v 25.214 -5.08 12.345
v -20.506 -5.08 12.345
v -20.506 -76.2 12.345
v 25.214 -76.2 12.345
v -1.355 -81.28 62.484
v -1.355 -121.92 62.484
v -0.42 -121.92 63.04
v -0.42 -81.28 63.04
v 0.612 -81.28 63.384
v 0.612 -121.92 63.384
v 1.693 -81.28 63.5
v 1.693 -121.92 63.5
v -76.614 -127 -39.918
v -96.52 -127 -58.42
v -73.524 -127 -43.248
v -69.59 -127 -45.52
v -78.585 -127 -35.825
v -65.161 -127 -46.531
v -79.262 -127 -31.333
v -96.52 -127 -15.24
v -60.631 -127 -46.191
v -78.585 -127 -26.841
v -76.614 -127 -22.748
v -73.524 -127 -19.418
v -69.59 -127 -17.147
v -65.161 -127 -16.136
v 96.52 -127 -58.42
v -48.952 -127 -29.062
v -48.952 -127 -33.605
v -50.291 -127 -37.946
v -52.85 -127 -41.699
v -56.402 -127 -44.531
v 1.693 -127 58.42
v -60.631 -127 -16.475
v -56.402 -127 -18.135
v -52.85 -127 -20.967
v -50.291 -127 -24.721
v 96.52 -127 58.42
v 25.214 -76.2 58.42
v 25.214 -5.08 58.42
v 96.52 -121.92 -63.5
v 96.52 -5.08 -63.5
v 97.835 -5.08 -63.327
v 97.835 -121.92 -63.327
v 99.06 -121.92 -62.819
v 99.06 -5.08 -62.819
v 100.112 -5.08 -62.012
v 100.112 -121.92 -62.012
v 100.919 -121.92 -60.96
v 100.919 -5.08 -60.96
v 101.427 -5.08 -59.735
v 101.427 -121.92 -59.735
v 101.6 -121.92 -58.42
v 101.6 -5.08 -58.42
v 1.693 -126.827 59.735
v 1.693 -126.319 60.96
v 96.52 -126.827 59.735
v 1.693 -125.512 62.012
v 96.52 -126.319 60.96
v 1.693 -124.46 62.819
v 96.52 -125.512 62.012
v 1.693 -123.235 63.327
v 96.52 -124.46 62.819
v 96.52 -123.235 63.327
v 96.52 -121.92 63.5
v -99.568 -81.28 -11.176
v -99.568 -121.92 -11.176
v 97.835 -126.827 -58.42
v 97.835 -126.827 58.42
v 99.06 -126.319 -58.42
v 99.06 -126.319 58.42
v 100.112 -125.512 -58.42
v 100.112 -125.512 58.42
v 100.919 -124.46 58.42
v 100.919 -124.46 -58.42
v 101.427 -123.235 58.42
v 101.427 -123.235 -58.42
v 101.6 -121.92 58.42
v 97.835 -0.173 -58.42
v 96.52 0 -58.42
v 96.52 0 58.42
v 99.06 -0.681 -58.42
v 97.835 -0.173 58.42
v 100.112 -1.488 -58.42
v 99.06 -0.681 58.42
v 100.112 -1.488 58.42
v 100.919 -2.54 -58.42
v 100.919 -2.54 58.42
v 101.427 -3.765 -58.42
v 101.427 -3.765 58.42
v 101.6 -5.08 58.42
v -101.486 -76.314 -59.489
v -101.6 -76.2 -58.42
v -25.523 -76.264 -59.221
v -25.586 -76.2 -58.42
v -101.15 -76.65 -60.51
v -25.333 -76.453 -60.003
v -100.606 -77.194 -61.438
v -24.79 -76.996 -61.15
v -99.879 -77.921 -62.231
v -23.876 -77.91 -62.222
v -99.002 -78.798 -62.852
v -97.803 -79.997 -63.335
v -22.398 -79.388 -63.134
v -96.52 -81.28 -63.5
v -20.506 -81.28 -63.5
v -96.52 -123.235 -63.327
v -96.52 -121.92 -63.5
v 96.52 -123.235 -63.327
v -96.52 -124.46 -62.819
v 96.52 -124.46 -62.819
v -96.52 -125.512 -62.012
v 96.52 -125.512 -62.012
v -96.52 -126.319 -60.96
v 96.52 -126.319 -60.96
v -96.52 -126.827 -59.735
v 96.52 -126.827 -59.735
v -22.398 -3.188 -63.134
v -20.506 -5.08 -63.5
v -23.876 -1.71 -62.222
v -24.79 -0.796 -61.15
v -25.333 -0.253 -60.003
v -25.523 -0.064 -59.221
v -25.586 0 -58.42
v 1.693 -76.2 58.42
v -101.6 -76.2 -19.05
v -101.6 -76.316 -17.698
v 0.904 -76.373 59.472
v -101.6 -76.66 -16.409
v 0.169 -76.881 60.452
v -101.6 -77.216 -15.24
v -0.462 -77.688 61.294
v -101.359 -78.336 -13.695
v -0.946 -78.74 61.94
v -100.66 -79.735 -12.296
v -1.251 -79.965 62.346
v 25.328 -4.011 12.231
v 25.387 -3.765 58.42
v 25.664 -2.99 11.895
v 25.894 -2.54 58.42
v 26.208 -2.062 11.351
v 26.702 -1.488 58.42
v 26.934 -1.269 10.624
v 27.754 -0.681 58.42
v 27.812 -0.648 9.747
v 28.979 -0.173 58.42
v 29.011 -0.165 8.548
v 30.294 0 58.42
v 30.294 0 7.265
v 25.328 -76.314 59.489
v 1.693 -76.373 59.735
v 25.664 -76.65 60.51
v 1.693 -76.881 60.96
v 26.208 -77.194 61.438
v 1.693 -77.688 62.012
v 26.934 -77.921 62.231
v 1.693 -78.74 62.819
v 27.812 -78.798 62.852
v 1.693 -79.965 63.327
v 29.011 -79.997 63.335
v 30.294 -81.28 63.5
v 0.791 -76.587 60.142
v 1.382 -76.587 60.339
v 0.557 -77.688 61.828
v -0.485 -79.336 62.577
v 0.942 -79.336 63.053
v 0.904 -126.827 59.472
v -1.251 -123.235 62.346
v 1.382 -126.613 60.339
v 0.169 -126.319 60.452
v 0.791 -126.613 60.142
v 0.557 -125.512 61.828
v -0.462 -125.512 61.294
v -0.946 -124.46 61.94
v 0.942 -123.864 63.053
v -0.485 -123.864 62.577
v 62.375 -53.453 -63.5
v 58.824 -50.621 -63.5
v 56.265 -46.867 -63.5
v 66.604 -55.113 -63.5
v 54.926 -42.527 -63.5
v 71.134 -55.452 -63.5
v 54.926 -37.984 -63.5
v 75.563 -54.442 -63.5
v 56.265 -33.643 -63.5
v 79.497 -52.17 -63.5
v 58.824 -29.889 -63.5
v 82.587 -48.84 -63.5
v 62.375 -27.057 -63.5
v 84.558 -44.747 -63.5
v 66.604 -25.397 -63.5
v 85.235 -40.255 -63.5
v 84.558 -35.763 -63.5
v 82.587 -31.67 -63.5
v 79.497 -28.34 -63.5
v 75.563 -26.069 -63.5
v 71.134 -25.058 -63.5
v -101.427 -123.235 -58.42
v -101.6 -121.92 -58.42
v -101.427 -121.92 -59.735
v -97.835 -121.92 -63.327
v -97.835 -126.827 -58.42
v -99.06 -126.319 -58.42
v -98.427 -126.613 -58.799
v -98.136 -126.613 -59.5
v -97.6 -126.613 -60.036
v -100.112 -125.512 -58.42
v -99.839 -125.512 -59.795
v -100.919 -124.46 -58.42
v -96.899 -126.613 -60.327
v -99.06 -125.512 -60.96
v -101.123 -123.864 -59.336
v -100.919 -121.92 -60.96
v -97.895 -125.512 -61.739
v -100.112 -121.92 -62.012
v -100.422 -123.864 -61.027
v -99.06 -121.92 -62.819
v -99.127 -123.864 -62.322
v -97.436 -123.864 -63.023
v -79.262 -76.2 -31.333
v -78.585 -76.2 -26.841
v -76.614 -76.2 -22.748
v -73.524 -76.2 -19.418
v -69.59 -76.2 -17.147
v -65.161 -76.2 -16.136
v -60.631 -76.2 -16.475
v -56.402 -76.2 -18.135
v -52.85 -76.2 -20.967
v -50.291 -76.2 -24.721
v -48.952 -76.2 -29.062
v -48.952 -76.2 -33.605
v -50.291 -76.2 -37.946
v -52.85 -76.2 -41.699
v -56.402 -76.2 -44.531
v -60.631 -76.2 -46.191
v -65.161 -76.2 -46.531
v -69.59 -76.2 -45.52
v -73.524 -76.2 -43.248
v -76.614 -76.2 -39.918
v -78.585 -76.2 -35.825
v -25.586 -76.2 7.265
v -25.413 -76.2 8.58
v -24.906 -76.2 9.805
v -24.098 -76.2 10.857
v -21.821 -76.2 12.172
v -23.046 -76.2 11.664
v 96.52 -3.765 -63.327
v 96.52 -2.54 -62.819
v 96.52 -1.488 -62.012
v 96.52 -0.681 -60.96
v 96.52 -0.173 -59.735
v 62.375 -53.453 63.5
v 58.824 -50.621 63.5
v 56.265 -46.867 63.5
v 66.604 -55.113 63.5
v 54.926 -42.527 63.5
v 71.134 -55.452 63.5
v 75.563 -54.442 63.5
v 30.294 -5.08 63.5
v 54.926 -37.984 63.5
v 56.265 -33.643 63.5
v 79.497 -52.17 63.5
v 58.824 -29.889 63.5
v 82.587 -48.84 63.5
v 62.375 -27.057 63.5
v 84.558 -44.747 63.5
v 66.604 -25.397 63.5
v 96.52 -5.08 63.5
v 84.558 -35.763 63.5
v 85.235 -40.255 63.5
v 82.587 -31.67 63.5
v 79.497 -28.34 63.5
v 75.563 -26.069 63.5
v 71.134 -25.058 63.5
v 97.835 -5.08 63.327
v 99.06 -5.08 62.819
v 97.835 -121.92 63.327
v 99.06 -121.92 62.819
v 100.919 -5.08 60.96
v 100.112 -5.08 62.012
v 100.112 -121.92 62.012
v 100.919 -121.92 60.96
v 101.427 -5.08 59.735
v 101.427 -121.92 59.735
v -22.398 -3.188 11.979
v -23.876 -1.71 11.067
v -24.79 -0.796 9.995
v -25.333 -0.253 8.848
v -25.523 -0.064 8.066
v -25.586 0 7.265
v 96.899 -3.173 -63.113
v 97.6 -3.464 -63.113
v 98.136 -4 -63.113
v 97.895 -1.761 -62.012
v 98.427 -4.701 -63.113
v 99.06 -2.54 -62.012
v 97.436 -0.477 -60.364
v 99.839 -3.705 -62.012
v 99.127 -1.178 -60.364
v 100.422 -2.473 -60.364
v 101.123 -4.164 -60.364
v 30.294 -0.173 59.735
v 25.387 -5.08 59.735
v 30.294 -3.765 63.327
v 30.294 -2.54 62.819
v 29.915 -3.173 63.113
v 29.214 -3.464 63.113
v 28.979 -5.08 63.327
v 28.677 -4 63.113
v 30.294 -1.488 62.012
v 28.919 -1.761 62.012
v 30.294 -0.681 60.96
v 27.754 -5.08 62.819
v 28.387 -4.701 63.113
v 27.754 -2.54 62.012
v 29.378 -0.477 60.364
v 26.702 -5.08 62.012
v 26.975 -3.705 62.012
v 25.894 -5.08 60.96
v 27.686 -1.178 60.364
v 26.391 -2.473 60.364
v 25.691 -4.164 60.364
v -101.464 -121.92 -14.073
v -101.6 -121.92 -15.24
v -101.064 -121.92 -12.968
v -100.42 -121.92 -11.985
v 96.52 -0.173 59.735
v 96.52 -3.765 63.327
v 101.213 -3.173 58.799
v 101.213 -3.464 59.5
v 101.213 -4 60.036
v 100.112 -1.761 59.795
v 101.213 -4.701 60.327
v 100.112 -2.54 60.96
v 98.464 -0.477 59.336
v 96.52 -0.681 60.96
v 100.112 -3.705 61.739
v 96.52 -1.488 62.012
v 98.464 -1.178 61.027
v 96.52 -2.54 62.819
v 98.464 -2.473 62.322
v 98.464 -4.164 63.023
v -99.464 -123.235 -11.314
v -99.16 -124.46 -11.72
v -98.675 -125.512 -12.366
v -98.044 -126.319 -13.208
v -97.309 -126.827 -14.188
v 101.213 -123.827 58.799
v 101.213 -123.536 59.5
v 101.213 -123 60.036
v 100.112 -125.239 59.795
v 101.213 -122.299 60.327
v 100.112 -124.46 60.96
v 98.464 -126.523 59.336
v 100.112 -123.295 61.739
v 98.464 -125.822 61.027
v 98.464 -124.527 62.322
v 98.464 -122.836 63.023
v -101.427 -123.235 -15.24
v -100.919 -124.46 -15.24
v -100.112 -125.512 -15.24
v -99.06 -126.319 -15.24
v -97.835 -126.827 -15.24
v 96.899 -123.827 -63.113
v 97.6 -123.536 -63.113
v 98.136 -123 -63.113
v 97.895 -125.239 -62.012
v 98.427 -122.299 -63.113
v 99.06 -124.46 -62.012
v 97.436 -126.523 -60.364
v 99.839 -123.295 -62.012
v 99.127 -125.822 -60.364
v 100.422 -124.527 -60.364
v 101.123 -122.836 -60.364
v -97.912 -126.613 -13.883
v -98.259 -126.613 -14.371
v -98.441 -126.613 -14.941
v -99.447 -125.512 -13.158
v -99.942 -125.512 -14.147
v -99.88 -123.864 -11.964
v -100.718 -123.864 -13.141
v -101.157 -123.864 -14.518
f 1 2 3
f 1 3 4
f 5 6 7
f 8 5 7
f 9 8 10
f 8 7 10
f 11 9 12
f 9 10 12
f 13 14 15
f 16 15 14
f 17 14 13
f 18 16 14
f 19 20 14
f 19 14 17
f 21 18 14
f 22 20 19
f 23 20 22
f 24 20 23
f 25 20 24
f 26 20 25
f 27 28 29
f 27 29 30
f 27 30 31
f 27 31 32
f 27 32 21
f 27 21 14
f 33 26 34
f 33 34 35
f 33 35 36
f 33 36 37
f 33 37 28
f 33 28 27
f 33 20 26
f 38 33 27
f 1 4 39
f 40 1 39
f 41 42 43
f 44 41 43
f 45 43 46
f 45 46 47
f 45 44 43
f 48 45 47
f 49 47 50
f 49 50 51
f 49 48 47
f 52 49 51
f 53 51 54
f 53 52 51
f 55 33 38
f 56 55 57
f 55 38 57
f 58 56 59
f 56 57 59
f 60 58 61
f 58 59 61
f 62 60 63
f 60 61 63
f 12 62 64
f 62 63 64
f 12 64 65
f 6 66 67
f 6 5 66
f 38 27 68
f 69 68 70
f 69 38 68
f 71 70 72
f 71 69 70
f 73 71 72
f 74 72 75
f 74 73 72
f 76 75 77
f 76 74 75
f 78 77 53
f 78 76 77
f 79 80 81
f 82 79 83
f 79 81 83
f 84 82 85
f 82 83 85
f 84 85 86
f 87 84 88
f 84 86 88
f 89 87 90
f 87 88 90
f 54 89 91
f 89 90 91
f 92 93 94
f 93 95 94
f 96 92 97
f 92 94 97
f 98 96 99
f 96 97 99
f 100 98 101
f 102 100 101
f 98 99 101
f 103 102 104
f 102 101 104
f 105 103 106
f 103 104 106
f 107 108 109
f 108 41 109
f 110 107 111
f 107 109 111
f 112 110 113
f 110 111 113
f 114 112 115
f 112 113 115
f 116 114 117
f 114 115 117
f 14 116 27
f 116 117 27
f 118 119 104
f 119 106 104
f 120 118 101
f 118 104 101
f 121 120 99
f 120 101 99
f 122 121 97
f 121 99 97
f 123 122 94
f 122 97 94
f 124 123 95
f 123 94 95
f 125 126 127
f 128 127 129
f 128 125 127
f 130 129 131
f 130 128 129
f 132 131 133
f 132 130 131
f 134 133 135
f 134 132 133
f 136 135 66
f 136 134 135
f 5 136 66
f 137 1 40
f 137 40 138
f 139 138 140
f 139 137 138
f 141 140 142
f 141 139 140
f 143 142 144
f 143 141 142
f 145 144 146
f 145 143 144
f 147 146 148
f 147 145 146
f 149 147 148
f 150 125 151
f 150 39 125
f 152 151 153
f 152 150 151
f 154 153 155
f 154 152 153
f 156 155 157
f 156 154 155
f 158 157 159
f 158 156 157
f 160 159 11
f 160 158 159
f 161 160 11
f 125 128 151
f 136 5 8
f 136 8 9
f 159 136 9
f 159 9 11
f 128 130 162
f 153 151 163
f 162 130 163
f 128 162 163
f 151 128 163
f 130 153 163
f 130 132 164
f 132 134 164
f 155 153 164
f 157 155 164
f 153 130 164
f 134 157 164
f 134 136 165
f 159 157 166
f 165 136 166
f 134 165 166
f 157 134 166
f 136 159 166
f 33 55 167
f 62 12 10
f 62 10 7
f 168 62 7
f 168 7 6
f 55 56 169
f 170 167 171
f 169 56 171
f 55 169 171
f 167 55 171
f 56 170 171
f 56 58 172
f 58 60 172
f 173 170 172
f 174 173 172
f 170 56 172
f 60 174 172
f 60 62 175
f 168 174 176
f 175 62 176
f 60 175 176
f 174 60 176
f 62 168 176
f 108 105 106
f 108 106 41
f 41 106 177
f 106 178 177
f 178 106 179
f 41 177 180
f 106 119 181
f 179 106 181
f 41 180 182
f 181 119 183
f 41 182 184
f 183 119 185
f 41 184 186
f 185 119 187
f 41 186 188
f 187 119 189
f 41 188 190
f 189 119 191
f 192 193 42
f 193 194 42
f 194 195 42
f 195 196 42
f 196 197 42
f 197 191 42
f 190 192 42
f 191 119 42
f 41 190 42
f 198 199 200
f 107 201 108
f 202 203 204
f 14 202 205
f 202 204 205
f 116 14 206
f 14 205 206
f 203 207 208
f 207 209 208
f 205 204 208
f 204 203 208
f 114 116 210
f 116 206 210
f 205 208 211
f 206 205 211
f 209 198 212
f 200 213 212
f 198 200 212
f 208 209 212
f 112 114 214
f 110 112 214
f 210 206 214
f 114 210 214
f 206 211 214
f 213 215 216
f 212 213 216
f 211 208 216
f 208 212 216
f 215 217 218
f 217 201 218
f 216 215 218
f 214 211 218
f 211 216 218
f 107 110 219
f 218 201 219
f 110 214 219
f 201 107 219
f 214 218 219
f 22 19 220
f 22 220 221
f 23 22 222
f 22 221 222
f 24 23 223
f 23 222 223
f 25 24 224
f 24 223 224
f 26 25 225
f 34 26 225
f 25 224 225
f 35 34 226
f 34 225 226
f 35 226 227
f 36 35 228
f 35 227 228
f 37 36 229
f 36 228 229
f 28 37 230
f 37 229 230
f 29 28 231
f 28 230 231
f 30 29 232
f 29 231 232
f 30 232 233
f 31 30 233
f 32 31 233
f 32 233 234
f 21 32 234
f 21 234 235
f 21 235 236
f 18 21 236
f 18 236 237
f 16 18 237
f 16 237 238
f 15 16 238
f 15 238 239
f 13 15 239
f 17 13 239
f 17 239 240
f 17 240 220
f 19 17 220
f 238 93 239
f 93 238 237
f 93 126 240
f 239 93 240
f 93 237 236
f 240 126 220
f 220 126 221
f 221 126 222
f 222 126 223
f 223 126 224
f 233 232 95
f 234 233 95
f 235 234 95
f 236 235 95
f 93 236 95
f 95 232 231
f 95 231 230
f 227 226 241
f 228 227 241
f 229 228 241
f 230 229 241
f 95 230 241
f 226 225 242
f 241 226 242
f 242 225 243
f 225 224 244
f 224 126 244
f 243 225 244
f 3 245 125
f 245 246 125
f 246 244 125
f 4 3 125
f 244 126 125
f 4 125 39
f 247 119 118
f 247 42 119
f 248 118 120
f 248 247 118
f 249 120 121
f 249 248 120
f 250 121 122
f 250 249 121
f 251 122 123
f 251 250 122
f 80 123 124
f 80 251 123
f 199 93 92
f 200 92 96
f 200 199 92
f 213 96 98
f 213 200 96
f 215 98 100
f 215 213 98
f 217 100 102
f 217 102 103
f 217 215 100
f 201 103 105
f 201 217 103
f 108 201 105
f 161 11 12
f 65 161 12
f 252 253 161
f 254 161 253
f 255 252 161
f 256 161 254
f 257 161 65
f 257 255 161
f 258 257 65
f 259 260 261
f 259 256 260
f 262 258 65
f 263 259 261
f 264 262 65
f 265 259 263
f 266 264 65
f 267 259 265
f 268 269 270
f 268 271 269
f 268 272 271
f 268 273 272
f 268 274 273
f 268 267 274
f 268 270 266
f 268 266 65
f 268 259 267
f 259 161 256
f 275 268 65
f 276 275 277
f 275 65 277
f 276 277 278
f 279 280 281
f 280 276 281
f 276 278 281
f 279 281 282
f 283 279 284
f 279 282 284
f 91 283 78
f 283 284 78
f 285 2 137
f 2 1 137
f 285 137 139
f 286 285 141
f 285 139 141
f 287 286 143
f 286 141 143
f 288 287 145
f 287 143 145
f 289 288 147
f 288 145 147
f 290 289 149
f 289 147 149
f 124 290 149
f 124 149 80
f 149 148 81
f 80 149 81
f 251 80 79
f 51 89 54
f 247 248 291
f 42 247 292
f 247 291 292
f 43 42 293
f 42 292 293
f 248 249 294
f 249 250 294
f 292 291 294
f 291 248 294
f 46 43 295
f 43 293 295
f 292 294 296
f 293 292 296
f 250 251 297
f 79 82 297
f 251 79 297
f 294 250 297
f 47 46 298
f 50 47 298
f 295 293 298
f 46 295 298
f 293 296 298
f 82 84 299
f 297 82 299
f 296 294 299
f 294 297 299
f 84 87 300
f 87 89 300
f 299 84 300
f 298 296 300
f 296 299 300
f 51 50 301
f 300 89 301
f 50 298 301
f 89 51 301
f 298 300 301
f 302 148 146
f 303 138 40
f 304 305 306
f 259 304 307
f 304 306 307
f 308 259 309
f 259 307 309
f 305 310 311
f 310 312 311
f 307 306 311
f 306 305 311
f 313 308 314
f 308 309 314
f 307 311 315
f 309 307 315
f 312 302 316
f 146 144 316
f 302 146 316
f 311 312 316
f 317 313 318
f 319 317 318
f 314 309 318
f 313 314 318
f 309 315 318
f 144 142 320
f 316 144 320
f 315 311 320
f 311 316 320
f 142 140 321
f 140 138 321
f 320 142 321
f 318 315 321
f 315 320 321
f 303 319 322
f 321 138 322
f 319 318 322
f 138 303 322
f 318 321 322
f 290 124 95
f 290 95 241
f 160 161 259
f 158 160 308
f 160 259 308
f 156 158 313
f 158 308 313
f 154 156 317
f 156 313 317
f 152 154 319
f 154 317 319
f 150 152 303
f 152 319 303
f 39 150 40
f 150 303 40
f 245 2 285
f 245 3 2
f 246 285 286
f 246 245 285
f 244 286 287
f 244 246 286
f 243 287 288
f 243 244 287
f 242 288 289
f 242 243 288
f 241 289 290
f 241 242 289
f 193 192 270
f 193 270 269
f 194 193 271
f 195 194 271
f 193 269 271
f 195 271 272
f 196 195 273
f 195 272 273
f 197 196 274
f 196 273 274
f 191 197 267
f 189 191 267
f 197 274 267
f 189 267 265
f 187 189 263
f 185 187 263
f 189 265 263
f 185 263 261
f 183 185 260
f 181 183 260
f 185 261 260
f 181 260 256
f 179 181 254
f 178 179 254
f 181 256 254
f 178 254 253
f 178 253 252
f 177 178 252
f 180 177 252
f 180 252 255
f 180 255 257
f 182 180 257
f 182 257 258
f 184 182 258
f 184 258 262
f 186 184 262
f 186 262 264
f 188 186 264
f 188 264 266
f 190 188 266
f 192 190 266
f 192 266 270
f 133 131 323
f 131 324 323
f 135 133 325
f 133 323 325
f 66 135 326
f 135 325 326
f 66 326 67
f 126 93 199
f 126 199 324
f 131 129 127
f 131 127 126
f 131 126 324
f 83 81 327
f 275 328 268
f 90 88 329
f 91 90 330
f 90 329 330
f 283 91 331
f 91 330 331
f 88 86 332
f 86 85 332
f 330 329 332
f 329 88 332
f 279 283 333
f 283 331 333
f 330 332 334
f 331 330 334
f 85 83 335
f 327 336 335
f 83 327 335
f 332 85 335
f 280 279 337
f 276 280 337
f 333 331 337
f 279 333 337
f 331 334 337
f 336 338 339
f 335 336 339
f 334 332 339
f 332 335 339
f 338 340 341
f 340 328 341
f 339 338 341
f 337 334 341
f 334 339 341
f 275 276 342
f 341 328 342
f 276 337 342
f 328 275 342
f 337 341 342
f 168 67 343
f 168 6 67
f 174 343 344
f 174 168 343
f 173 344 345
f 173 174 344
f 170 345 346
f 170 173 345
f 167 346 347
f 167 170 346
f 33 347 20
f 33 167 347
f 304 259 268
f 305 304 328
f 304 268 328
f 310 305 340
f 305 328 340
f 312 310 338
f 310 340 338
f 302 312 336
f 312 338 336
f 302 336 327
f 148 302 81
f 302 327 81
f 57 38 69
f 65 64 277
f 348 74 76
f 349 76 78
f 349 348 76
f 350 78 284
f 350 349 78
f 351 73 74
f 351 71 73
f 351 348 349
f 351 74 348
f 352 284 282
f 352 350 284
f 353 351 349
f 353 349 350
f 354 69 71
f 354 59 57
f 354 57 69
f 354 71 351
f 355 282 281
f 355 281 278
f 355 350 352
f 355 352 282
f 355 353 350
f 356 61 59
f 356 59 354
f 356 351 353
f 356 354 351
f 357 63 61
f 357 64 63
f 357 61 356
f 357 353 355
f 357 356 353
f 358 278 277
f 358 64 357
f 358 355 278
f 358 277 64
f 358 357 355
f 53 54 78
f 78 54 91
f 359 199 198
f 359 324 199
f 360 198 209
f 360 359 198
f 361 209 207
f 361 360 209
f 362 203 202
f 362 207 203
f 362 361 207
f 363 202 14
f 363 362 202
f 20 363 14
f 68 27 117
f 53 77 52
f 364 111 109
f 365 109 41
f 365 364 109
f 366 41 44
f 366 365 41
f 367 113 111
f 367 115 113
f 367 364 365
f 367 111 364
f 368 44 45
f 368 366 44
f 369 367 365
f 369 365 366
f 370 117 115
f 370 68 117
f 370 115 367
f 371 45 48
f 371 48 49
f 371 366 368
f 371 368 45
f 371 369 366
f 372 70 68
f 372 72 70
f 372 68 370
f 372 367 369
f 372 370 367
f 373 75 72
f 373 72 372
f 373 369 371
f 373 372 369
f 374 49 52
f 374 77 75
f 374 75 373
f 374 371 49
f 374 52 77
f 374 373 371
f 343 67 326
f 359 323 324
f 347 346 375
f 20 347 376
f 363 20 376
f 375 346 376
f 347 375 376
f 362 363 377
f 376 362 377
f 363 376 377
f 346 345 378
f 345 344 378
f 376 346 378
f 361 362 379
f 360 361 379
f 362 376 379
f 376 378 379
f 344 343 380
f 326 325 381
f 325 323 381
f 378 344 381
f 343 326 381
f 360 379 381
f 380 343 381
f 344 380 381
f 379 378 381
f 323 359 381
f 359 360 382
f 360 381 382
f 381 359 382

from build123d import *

# Parameters (mm, degrees)
F0_W          = 203.2
F0_H          = 127
F1_DEPTH      = 127
F3_DEPTH      = 76.2
F3_DEPTH_BACK = 76.2
F4_DEPTH      = 25.4
F5_SIZE2      = 101.6
F5_SIZE       = 76.2
F6_R          = 5.08
F7_R          = 15.24
F8_DEPTH      = 51.054
F9_R          = 15.24
F10_DEPTH     = 128.27


with BuildPart() as f1:
    # F0 (on Front) → F1 (new body)
    with BuildSketch(Plane.XZ):
        Rectangle(F0_W, F0_H)
    extrude(amount=F1_DEPTH)

    # F2 (on Front) → F3 (cut, two sides)
    with BuildSketch(Plane.XZ) as f3_sk:
        Polygon((25.2138410211, 63.1450035885), (-101.7861589789, 63.1450035885), (-101.7861589789, -63.8549964115), (-25.5861589789, -63.8549964115), (-25.5861589789, 12.3450035885), (25.2138410211, 12.3450035885), align=None)
    extrude(amount=-F3_DEPTH, mode=Mode.SUBTRACT)
    extrude(f3_sk.sketch, amount=F3_DEPTH_BACK, mode=Mode.SUBTRACT)

    # F4 (cut): a face of the model
    f4_faces = [f1.faces().sort_by_distance(p)[0] for p in [
        (-38.1930794895, -38.1, 63.1450035885),
    ]]
    extrude(f4_faces, amount=-F4_DEPTH, mode=Mode.SUBTRACT)

    # F5
    f5_edges = [f1.edges().sort_by_distance(p)[0] for p in [
        (-101.6, -101.6, 63.5),
    ]]
    f5_side = f1.faces().sort_by_distance((-101.6, -101.6, 0))[0]
    chamfer(f5_edges, length=F5_SIZE, length2=F5_SIZE2, reference=f5_side)

    # F6
    f6_edges = [f1.edges().sort_by_distance(p)[0] for p in [
        (25.213841, 0, 37.922502),
        (63.406921, 0, 63.5),
        (-0.186159, 0, 12.345004),
        (-25.586159, -38.1, 12.345004),
        (-101.6, -101.6, -12.7),
        (0, -101.6, 63.5),
        (101.6, 0, 0),
        (38.006921, 0, -63.5),
        (-25.586159, -38.1, -63.5),
        (-63.593079, -76.2, -63.5),
        (-101.6, -101.6, -63.5),
        (50.8, -127, 63.5),
        (-50.8, -127, 25.4),
        (101.6, -127, 0),
        (-101.6, -127, -38.1),
        (0, -127, -63.5),
        (-50.8, -76.2, 25.4),
        (101.6, -63.5, 63.5),
        (101.6, -63.5, -63.5),
        (12.606921, -76.2, 63.5),
        (25.213841, -38.1, 63.5),
    ]]
    fillet(f6_edges, radius=F6_R)

    # F7 (on face) → F8 (cut)
    with BuildSketch(Plane(origin=(0, -76.2, 0), x_dir=(-1, 0, 0), z_dir=(0, 1, 0))):
        with Locations((64.0217885375, -31.3331931829)):
            Circle(F7_R)
    extrude(amount=-F8_DEPTH, mode=Mode.SUBTRACT)

    # F9 (on face) → F10 (cut)
    with BuildSketch(Plane.XY.offset(63.5)):
        with Locations((69.9954107404, -40.2551107109)):
            Circle(F9_R)
    extrude(amount=-F10_DEPTH, mode=Mode.SUBTRACT)


solid = f1.part
